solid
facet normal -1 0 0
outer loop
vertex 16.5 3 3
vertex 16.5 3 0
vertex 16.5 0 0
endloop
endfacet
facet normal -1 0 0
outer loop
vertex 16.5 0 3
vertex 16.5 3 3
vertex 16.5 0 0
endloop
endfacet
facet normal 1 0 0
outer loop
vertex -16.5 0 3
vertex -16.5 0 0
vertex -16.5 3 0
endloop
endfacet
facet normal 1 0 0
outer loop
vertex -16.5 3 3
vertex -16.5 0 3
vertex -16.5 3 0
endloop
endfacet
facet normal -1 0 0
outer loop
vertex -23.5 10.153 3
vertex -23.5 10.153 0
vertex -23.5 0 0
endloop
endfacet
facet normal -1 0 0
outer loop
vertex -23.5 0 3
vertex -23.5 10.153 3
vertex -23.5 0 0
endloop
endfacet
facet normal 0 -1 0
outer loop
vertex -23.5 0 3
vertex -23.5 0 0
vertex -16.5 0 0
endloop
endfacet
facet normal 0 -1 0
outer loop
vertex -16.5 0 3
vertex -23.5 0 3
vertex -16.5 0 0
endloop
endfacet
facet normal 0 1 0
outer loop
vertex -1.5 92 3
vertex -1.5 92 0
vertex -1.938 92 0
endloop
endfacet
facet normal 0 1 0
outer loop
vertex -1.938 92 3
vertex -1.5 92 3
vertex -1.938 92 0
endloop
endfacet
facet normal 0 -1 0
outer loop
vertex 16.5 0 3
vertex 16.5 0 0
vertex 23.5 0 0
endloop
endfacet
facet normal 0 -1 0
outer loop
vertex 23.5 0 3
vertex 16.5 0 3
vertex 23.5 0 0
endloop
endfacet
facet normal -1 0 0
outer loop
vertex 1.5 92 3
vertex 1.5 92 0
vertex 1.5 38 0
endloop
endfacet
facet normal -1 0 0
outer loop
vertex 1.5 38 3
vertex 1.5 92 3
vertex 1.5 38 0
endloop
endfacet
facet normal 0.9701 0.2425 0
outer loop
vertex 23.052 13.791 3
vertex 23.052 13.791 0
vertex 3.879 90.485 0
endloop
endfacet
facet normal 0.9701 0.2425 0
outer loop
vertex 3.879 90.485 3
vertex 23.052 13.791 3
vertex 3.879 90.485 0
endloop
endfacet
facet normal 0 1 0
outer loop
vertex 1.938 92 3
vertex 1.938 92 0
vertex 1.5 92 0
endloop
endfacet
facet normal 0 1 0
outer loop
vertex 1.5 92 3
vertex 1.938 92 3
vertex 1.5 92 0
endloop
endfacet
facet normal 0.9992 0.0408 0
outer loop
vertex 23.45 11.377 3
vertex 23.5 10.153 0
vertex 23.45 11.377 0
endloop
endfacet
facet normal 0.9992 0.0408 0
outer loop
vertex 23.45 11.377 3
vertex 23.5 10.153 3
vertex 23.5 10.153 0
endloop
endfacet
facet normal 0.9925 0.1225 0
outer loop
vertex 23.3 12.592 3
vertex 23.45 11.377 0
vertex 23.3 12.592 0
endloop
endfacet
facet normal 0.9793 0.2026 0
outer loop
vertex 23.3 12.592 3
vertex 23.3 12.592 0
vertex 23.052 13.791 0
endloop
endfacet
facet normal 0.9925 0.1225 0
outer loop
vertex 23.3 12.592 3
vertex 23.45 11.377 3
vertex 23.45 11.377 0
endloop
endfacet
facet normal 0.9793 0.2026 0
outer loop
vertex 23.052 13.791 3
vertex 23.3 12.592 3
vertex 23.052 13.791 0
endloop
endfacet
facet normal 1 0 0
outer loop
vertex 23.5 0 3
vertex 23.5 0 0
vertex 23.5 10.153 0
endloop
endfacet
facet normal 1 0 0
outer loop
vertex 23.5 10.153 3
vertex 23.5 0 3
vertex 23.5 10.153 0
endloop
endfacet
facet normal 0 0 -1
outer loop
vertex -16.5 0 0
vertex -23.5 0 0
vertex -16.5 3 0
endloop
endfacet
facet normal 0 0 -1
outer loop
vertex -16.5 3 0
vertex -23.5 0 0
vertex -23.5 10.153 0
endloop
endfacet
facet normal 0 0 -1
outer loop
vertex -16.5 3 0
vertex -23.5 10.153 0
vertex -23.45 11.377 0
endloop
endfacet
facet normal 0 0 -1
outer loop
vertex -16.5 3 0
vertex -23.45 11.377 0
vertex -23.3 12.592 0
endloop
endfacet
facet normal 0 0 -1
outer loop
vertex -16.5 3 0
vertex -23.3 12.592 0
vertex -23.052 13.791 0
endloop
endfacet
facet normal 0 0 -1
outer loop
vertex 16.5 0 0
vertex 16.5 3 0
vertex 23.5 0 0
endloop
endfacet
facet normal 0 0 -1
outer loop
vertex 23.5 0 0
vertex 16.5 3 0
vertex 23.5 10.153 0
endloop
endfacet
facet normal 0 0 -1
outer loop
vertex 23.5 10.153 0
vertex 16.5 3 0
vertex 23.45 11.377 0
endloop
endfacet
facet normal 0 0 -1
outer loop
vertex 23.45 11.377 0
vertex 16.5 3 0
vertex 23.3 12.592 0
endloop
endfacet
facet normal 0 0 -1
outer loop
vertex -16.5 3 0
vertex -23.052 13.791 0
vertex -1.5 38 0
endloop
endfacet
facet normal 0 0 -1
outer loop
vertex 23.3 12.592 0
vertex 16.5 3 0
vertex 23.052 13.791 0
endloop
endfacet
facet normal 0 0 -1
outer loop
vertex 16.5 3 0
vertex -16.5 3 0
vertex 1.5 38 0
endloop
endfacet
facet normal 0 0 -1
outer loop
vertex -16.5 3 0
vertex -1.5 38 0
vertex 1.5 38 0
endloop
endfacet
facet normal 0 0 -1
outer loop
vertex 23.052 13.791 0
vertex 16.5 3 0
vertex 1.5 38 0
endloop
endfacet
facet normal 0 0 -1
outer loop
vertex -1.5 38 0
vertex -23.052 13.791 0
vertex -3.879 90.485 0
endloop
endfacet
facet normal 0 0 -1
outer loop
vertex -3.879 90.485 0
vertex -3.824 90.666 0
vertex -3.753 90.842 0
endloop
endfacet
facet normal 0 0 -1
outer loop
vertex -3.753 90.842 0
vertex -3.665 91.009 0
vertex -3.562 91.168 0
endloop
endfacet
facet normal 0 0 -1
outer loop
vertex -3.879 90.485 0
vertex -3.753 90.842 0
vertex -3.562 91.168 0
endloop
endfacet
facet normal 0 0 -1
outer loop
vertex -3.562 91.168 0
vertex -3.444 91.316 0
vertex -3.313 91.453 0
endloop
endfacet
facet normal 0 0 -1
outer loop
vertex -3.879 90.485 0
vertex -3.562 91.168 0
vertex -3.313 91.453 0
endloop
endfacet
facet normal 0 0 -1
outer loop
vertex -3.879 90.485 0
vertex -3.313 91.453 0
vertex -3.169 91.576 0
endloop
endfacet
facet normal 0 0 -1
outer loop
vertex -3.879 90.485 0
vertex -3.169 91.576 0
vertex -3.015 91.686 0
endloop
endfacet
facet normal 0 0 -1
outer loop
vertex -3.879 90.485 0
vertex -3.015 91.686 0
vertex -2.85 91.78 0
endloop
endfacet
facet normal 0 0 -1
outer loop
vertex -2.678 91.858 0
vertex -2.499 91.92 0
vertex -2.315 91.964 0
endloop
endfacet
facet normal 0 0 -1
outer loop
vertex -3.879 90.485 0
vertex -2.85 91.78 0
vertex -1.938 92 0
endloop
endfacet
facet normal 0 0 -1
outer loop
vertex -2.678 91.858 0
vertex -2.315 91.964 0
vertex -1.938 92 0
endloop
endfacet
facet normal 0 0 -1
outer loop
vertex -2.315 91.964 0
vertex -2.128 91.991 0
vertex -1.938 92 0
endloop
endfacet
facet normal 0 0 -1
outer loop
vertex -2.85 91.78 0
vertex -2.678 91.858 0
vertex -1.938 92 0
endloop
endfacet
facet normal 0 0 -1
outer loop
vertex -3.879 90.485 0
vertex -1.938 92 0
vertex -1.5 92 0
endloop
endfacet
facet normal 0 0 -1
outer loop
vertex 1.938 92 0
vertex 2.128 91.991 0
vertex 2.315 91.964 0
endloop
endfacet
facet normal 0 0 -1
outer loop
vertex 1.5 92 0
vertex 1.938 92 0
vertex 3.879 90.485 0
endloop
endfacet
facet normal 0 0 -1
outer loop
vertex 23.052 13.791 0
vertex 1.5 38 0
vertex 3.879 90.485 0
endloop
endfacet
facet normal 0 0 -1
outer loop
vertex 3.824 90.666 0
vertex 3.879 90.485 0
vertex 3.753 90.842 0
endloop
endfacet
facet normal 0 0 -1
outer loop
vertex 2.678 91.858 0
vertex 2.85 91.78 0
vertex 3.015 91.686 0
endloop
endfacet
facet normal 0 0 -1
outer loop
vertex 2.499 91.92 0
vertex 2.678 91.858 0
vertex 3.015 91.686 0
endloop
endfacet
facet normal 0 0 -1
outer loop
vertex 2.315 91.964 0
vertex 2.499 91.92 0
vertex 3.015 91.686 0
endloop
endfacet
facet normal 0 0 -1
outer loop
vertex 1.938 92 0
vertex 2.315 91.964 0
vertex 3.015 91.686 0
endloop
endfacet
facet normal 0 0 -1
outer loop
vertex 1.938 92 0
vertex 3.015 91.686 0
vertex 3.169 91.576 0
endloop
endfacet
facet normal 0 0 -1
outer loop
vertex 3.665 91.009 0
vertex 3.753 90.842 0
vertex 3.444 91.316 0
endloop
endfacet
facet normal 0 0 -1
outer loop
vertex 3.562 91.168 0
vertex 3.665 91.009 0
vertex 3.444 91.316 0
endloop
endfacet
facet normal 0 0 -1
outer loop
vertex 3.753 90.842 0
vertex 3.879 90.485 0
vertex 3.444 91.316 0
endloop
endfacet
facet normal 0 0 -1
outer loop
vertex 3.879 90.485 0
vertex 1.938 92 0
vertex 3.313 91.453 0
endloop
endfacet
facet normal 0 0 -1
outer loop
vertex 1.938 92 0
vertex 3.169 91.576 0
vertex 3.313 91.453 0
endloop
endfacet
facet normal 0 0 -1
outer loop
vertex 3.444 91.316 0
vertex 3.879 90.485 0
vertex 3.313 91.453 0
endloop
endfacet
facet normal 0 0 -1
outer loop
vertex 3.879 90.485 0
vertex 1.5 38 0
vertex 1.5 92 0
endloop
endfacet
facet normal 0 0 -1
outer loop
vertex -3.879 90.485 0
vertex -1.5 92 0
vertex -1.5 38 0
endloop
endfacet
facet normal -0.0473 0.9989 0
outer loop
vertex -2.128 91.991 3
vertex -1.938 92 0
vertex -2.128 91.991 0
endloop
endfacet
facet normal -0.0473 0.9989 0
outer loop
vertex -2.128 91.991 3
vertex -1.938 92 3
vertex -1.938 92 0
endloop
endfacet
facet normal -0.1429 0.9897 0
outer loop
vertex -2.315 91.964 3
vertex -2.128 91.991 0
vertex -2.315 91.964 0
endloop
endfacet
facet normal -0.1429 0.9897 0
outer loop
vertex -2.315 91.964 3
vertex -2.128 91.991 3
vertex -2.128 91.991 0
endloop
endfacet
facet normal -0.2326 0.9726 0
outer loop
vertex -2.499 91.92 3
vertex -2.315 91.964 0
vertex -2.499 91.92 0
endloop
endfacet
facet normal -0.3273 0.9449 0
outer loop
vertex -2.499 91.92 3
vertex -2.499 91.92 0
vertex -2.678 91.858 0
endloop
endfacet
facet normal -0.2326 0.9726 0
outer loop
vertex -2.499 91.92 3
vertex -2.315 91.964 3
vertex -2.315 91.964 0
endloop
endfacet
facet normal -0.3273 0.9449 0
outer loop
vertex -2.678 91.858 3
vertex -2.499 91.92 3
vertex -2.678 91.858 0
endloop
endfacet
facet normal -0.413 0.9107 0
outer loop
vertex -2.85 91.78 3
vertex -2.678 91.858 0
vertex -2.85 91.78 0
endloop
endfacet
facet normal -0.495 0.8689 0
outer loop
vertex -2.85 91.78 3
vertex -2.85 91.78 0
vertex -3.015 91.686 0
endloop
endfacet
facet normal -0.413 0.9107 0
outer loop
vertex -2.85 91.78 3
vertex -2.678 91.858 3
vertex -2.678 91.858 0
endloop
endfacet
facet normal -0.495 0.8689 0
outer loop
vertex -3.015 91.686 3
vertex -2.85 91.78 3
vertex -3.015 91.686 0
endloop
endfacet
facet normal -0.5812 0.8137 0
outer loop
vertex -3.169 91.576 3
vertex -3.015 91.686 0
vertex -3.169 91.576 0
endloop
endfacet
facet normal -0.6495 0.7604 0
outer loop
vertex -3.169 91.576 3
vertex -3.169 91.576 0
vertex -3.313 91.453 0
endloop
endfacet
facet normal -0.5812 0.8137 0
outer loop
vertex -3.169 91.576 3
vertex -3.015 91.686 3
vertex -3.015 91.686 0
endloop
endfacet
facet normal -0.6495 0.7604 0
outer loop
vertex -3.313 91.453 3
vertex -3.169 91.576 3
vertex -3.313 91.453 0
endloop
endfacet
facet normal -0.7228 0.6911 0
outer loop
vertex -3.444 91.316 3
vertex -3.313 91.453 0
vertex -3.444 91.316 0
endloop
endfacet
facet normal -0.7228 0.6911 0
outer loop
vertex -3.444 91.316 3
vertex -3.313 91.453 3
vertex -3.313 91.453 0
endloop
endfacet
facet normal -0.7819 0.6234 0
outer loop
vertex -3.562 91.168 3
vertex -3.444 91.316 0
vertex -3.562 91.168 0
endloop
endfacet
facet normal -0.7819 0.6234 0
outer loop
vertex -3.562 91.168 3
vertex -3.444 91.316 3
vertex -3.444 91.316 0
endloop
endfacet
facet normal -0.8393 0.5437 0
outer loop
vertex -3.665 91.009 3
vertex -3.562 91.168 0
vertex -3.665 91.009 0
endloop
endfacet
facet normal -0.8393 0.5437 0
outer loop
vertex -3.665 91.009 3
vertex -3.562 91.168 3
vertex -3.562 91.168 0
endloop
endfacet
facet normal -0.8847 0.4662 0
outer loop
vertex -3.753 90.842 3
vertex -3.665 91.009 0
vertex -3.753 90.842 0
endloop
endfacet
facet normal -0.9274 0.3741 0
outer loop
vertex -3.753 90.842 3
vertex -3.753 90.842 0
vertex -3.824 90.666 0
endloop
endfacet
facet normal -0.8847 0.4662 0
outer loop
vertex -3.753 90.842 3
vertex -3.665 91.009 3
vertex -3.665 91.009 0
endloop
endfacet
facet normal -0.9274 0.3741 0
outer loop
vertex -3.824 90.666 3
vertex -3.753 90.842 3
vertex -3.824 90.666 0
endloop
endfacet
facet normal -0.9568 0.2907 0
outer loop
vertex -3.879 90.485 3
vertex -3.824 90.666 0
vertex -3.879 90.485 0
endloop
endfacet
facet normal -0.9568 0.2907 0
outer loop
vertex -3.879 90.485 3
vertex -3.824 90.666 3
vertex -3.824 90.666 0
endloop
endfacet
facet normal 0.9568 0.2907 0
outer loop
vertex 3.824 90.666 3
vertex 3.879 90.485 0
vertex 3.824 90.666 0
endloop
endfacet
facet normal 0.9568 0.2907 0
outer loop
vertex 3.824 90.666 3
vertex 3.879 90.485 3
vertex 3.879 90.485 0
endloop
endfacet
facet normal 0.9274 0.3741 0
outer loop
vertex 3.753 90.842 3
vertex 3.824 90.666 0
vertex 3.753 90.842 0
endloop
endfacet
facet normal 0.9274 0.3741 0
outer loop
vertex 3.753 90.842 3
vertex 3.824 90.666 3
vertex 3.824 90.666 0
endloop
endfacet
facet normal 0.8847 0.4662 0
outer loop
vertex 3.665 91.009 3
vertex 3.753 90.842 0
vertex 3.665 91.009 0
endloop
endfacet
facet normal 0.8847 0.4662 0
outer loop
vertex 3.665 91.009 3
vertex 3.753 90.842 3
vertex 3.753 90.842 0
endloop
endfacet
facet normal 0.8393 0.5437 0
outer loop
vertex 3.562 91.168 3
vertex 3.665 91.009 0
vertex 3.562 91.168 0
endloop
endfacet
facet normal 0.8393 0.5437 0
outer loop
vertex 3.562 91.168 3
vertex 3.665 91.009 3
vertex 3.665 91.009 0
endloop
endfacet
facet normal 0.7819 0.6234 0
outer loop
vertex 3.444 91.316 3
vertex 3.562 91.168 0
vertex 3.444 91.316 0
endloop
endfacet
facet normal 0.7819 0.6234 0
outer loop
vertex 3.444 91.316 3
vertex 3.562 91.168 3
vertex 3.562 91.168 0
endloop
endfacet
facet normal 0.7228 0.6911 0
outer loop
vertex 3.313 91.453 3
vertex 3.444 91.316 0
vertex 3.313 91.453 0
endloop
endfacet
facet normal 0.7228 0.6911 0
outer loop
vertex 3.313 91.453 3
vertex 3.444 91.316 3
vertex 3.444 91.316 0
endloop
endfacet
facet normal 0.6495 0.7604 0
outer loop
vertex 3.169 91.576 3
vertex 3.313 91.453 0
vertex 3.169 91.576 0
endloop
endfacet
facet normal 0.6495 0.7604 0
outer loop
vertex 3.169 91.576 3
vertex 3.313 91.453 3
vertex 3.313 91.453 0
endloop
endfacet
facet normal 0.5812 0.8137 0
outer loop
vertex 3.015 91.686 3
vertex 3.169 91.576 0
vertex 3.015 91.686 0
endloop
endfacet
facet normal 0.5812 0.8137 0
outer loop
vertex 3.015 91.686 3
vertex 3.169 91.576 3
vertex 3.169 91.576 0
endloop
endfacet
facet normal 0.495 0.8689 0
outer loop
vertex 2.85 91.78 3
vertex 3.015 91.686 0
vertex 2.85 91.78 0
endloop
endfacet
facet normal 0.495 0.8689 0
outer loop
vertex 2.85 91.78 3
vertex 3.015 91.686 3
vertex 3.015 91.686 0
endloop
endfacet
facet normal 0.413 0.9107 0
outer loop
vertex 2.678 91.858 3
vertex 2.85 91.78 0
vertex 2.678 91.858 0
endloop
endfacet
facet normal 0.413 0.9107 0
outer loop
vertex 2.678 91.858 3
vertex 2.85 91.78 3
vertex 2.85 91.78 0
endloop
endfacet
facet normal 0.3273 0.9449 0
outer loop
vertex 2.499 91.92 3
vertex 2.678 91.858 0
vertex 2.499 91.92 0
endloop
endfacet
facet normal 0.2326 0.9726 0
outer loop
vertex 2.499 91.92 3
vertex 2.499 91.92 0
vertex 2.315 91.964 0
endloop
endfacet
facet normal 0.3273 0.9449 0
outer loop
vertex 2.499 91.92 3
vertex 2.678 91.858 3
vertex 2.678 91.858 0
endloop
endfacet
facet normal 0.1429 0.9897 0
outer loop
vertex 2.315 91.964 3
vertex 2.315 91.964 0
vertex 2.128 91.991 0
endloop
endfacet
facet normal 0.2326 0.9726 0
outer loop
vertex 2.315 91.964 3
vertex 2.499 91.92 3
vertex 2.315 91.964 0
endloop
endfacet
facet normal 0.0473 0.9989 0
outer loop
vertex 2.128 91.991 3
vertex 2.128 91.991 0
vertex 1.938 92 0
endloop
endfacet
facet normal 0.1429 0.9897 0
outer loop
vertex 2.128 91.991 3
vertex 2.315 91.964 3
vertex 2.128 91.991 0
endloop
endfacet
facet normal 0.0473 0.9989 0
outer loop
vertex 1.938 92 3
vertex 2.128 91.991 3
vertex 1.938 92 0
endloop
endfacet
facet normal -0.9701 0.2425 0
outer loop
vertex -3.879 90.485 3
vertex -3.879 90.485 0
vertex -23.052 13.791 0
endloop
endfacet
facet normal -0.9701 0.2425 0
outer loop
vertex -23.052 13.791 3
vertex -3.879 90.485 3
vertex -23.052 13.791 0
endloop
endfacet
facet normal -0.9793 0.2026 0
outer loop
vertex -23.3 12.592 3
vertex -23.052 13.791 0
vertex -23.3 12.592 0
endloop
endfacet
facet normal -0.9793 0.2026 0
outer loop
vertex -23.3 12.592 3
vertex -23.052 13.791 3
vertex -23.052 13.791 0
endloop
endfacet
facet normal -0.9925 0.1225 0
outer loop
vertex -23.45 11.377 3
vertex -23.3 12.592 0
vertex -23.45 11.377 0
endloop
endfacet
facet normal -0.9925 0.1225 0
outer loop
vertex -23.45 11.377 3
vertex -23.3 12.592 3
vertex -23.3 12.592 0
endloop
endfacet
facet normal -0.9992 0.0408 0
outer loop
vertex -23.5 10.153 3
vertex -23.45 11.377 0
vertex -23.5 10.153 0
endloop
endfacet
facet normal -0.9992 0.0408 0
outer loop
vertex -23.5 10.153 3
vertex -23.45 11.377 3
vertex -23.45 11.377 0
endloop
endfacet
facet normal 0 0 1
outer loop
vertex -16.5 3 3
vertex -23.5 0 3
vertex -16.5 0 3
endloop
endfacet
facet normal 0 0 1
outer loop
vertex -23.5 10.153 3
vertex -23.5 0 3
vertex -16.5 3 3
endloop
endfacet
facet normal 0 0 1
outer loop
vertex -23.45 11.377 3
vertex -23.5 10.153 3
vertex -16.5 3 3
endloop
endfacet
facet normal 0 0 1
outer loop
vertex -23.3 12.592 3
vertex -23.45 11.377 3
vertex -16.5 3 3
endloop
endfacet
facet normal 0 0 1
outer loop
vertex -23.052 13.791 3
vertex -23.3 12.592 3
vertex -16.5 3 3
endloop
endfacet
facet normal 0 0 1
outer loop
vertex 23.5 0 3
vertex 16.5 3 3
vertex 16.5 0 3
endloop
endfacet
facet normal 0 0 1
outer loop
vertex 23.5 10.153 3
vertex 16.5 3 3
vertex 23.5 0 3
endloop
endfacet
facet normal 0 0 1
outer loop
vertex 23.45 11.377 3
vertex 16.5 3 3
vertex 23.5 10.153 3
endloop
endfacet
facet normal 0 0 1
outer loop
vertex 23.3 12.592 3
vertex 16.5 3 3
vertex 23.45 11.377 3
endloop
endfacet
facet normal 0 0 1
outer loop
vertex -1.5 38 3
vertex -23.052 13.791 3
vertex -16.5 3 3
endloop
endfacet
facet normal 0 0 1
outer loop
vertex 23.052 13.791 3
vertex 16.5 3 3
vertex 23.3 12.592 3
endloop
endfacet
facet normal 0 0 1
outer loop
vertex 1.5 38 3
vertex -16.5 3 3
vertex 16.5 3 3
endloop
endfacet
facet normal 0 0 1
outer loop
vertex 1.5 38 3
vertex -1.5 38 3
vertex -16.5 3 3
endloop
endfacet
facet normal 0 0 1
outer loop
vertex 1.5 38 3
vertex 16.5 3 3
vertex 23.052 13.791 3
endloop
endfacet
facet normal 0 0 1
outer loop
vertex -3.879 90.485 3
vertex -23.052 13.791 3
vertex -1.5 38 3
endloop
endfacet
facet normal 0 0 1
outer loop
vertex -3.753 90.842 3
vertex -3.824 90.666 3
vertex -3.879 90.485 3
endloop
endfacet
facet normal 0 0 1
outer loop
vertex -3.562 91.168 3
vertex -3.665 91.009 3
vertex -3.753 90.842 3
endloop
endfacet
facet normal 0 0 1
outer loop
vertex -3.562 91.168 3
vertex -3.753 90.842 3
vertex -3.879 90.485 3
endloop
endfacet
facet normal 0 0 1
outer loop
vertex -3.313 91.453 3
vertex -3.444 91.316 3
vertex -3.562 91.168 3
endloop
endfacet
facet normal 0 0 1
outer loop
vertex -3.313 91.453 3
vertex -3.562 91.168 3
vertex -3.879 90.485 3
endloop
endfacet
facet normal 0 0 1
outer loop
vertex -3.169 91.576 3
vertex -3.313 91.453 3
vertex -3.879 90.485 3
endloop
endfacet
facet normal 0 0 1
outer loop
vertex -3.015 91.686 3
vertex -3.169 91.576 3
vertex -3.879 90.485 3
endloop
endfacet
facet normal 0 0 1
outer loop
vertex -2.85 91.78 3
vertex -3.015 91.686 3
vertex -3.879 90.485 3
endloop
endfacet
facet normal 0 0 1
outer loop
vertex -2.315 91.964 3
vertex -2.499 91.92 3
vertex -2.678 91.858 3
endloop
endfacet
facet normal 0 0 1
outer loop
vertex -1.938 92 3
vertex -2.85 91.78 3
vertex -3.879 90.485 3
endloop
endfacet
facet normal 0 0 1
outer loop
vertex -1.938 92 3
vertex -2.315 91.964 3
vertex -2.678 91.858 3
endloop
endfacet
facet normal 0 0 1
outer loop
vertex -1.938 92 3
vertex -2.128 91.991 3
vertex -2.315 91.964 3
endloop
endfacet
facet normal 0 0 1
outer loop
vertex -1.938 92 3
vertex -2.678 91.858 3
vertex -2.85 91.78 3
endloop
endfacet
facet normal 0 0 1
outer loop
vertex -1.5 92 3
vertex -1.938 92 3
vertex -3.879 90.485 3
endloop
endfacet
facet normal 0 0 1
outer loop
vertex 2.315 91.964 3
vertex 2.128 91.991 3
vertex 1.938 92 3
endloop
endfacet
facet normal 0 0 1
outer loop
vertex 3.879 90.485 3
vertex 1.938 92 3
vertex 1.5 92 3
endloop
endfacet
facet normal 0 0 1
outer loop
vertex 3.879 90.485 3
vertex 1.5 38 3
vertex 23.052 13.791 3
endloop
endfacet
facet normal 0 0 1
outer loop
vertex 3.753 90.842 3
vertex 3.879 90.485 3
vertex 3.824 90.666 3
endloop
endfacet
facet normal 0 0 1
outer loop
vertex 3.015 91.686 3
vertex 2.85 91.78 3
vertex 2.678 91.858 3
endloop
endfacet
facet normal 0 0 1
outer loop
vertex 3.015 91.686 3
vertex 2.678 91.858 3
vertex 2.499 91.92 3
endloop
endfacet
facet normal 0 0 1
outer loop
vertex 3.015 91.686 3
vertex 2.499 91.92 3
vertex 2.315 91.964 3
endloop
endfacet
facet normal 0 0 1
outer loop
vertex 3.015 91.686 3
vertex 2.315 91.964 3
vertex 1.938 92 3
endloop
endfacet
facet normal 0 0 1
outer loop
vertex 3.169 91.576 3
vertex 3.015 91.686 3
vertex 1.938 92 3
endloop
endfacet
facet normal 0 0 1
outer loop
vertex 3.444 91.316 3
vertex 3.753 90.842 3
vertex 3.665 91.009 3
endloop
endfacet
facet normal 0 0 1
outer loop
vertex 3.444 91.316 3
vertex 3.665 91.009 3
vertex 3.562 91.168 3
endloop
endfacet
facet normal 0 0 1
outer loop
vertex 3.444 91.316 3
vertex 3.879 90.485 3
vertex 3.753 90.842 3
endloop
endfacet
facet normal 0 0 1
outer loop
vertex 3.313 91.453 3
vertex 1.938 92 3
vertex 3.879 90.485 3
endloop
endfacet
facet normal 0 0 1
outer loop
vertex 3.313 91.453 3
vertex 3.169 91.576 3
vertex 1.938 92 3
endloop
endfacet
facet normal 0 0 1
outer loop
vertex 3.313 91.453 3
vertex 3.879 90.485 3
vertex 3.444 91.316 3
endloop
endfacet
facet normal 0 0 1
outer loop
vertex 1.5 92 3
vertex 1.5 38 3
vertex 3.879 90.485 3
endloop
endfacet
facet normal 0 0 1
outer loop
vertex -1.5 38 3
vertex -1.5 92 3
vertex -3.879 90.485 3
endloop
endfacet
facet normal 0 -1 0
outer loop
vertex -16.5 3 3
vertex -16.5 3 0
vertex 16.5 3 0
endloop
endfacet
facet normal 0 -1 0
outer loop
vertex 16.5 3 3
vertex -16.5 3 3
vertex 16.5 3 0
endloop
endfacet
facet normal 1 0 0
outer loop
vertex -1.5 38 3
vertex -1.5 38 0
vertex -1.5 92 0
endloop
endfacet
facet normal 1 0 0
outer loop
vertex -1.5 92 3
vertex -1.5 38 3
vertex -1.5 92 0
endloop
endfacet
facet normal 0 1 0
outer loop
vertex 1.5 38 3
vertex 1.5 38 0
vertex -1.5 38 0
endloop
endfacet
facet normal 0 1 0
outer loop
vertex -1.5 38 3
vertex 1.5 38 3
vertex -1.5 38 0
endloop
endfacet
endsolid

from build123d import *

# Parameters (mm, degrees)
RESSALTO_EXTRUS_O1_DEPTH = 3
FILETE1_R                = 15
FILETE2_R                = 2


with BuildPart() as part:
    # Esboço1 → Ressalto-extrusão1 (new body)
    with BuildSketch(Plane.XY):
        Polygon((-23.5, 0), (-16.5, 0), (-16.5, 3), (16.5, 3), (16.5, 0), (23.5, 0), (23.5, 12), (3.5, 92), (1.5, 92), (1.5, 38), (-1.5, 38), (-1.5, 92), (-3.5, 92), (-23.5, 12), align=None)
    extrude(amount=RESSALTO_EXTRUS_O1_DEPTH)

    # Filete1
    filete1_edges = [part.edges().sort_by_distance(p)[0] for p in [
        (-23.5, 12, 1.5),
        (23.5, 12, 1.5),
    ]]
    fillet(filete1_edges, radius=FILETE1_R)

    # Filete2
    filete2_edges = [part.edges().sort_by_distance(p)[0] for p in [
        (-3.5, 92, 1.5),
        (3.5, 92, 1.5),
    ]]
    fillet(filete2_edges, radius=FILETE2_R)


solid = part.part
